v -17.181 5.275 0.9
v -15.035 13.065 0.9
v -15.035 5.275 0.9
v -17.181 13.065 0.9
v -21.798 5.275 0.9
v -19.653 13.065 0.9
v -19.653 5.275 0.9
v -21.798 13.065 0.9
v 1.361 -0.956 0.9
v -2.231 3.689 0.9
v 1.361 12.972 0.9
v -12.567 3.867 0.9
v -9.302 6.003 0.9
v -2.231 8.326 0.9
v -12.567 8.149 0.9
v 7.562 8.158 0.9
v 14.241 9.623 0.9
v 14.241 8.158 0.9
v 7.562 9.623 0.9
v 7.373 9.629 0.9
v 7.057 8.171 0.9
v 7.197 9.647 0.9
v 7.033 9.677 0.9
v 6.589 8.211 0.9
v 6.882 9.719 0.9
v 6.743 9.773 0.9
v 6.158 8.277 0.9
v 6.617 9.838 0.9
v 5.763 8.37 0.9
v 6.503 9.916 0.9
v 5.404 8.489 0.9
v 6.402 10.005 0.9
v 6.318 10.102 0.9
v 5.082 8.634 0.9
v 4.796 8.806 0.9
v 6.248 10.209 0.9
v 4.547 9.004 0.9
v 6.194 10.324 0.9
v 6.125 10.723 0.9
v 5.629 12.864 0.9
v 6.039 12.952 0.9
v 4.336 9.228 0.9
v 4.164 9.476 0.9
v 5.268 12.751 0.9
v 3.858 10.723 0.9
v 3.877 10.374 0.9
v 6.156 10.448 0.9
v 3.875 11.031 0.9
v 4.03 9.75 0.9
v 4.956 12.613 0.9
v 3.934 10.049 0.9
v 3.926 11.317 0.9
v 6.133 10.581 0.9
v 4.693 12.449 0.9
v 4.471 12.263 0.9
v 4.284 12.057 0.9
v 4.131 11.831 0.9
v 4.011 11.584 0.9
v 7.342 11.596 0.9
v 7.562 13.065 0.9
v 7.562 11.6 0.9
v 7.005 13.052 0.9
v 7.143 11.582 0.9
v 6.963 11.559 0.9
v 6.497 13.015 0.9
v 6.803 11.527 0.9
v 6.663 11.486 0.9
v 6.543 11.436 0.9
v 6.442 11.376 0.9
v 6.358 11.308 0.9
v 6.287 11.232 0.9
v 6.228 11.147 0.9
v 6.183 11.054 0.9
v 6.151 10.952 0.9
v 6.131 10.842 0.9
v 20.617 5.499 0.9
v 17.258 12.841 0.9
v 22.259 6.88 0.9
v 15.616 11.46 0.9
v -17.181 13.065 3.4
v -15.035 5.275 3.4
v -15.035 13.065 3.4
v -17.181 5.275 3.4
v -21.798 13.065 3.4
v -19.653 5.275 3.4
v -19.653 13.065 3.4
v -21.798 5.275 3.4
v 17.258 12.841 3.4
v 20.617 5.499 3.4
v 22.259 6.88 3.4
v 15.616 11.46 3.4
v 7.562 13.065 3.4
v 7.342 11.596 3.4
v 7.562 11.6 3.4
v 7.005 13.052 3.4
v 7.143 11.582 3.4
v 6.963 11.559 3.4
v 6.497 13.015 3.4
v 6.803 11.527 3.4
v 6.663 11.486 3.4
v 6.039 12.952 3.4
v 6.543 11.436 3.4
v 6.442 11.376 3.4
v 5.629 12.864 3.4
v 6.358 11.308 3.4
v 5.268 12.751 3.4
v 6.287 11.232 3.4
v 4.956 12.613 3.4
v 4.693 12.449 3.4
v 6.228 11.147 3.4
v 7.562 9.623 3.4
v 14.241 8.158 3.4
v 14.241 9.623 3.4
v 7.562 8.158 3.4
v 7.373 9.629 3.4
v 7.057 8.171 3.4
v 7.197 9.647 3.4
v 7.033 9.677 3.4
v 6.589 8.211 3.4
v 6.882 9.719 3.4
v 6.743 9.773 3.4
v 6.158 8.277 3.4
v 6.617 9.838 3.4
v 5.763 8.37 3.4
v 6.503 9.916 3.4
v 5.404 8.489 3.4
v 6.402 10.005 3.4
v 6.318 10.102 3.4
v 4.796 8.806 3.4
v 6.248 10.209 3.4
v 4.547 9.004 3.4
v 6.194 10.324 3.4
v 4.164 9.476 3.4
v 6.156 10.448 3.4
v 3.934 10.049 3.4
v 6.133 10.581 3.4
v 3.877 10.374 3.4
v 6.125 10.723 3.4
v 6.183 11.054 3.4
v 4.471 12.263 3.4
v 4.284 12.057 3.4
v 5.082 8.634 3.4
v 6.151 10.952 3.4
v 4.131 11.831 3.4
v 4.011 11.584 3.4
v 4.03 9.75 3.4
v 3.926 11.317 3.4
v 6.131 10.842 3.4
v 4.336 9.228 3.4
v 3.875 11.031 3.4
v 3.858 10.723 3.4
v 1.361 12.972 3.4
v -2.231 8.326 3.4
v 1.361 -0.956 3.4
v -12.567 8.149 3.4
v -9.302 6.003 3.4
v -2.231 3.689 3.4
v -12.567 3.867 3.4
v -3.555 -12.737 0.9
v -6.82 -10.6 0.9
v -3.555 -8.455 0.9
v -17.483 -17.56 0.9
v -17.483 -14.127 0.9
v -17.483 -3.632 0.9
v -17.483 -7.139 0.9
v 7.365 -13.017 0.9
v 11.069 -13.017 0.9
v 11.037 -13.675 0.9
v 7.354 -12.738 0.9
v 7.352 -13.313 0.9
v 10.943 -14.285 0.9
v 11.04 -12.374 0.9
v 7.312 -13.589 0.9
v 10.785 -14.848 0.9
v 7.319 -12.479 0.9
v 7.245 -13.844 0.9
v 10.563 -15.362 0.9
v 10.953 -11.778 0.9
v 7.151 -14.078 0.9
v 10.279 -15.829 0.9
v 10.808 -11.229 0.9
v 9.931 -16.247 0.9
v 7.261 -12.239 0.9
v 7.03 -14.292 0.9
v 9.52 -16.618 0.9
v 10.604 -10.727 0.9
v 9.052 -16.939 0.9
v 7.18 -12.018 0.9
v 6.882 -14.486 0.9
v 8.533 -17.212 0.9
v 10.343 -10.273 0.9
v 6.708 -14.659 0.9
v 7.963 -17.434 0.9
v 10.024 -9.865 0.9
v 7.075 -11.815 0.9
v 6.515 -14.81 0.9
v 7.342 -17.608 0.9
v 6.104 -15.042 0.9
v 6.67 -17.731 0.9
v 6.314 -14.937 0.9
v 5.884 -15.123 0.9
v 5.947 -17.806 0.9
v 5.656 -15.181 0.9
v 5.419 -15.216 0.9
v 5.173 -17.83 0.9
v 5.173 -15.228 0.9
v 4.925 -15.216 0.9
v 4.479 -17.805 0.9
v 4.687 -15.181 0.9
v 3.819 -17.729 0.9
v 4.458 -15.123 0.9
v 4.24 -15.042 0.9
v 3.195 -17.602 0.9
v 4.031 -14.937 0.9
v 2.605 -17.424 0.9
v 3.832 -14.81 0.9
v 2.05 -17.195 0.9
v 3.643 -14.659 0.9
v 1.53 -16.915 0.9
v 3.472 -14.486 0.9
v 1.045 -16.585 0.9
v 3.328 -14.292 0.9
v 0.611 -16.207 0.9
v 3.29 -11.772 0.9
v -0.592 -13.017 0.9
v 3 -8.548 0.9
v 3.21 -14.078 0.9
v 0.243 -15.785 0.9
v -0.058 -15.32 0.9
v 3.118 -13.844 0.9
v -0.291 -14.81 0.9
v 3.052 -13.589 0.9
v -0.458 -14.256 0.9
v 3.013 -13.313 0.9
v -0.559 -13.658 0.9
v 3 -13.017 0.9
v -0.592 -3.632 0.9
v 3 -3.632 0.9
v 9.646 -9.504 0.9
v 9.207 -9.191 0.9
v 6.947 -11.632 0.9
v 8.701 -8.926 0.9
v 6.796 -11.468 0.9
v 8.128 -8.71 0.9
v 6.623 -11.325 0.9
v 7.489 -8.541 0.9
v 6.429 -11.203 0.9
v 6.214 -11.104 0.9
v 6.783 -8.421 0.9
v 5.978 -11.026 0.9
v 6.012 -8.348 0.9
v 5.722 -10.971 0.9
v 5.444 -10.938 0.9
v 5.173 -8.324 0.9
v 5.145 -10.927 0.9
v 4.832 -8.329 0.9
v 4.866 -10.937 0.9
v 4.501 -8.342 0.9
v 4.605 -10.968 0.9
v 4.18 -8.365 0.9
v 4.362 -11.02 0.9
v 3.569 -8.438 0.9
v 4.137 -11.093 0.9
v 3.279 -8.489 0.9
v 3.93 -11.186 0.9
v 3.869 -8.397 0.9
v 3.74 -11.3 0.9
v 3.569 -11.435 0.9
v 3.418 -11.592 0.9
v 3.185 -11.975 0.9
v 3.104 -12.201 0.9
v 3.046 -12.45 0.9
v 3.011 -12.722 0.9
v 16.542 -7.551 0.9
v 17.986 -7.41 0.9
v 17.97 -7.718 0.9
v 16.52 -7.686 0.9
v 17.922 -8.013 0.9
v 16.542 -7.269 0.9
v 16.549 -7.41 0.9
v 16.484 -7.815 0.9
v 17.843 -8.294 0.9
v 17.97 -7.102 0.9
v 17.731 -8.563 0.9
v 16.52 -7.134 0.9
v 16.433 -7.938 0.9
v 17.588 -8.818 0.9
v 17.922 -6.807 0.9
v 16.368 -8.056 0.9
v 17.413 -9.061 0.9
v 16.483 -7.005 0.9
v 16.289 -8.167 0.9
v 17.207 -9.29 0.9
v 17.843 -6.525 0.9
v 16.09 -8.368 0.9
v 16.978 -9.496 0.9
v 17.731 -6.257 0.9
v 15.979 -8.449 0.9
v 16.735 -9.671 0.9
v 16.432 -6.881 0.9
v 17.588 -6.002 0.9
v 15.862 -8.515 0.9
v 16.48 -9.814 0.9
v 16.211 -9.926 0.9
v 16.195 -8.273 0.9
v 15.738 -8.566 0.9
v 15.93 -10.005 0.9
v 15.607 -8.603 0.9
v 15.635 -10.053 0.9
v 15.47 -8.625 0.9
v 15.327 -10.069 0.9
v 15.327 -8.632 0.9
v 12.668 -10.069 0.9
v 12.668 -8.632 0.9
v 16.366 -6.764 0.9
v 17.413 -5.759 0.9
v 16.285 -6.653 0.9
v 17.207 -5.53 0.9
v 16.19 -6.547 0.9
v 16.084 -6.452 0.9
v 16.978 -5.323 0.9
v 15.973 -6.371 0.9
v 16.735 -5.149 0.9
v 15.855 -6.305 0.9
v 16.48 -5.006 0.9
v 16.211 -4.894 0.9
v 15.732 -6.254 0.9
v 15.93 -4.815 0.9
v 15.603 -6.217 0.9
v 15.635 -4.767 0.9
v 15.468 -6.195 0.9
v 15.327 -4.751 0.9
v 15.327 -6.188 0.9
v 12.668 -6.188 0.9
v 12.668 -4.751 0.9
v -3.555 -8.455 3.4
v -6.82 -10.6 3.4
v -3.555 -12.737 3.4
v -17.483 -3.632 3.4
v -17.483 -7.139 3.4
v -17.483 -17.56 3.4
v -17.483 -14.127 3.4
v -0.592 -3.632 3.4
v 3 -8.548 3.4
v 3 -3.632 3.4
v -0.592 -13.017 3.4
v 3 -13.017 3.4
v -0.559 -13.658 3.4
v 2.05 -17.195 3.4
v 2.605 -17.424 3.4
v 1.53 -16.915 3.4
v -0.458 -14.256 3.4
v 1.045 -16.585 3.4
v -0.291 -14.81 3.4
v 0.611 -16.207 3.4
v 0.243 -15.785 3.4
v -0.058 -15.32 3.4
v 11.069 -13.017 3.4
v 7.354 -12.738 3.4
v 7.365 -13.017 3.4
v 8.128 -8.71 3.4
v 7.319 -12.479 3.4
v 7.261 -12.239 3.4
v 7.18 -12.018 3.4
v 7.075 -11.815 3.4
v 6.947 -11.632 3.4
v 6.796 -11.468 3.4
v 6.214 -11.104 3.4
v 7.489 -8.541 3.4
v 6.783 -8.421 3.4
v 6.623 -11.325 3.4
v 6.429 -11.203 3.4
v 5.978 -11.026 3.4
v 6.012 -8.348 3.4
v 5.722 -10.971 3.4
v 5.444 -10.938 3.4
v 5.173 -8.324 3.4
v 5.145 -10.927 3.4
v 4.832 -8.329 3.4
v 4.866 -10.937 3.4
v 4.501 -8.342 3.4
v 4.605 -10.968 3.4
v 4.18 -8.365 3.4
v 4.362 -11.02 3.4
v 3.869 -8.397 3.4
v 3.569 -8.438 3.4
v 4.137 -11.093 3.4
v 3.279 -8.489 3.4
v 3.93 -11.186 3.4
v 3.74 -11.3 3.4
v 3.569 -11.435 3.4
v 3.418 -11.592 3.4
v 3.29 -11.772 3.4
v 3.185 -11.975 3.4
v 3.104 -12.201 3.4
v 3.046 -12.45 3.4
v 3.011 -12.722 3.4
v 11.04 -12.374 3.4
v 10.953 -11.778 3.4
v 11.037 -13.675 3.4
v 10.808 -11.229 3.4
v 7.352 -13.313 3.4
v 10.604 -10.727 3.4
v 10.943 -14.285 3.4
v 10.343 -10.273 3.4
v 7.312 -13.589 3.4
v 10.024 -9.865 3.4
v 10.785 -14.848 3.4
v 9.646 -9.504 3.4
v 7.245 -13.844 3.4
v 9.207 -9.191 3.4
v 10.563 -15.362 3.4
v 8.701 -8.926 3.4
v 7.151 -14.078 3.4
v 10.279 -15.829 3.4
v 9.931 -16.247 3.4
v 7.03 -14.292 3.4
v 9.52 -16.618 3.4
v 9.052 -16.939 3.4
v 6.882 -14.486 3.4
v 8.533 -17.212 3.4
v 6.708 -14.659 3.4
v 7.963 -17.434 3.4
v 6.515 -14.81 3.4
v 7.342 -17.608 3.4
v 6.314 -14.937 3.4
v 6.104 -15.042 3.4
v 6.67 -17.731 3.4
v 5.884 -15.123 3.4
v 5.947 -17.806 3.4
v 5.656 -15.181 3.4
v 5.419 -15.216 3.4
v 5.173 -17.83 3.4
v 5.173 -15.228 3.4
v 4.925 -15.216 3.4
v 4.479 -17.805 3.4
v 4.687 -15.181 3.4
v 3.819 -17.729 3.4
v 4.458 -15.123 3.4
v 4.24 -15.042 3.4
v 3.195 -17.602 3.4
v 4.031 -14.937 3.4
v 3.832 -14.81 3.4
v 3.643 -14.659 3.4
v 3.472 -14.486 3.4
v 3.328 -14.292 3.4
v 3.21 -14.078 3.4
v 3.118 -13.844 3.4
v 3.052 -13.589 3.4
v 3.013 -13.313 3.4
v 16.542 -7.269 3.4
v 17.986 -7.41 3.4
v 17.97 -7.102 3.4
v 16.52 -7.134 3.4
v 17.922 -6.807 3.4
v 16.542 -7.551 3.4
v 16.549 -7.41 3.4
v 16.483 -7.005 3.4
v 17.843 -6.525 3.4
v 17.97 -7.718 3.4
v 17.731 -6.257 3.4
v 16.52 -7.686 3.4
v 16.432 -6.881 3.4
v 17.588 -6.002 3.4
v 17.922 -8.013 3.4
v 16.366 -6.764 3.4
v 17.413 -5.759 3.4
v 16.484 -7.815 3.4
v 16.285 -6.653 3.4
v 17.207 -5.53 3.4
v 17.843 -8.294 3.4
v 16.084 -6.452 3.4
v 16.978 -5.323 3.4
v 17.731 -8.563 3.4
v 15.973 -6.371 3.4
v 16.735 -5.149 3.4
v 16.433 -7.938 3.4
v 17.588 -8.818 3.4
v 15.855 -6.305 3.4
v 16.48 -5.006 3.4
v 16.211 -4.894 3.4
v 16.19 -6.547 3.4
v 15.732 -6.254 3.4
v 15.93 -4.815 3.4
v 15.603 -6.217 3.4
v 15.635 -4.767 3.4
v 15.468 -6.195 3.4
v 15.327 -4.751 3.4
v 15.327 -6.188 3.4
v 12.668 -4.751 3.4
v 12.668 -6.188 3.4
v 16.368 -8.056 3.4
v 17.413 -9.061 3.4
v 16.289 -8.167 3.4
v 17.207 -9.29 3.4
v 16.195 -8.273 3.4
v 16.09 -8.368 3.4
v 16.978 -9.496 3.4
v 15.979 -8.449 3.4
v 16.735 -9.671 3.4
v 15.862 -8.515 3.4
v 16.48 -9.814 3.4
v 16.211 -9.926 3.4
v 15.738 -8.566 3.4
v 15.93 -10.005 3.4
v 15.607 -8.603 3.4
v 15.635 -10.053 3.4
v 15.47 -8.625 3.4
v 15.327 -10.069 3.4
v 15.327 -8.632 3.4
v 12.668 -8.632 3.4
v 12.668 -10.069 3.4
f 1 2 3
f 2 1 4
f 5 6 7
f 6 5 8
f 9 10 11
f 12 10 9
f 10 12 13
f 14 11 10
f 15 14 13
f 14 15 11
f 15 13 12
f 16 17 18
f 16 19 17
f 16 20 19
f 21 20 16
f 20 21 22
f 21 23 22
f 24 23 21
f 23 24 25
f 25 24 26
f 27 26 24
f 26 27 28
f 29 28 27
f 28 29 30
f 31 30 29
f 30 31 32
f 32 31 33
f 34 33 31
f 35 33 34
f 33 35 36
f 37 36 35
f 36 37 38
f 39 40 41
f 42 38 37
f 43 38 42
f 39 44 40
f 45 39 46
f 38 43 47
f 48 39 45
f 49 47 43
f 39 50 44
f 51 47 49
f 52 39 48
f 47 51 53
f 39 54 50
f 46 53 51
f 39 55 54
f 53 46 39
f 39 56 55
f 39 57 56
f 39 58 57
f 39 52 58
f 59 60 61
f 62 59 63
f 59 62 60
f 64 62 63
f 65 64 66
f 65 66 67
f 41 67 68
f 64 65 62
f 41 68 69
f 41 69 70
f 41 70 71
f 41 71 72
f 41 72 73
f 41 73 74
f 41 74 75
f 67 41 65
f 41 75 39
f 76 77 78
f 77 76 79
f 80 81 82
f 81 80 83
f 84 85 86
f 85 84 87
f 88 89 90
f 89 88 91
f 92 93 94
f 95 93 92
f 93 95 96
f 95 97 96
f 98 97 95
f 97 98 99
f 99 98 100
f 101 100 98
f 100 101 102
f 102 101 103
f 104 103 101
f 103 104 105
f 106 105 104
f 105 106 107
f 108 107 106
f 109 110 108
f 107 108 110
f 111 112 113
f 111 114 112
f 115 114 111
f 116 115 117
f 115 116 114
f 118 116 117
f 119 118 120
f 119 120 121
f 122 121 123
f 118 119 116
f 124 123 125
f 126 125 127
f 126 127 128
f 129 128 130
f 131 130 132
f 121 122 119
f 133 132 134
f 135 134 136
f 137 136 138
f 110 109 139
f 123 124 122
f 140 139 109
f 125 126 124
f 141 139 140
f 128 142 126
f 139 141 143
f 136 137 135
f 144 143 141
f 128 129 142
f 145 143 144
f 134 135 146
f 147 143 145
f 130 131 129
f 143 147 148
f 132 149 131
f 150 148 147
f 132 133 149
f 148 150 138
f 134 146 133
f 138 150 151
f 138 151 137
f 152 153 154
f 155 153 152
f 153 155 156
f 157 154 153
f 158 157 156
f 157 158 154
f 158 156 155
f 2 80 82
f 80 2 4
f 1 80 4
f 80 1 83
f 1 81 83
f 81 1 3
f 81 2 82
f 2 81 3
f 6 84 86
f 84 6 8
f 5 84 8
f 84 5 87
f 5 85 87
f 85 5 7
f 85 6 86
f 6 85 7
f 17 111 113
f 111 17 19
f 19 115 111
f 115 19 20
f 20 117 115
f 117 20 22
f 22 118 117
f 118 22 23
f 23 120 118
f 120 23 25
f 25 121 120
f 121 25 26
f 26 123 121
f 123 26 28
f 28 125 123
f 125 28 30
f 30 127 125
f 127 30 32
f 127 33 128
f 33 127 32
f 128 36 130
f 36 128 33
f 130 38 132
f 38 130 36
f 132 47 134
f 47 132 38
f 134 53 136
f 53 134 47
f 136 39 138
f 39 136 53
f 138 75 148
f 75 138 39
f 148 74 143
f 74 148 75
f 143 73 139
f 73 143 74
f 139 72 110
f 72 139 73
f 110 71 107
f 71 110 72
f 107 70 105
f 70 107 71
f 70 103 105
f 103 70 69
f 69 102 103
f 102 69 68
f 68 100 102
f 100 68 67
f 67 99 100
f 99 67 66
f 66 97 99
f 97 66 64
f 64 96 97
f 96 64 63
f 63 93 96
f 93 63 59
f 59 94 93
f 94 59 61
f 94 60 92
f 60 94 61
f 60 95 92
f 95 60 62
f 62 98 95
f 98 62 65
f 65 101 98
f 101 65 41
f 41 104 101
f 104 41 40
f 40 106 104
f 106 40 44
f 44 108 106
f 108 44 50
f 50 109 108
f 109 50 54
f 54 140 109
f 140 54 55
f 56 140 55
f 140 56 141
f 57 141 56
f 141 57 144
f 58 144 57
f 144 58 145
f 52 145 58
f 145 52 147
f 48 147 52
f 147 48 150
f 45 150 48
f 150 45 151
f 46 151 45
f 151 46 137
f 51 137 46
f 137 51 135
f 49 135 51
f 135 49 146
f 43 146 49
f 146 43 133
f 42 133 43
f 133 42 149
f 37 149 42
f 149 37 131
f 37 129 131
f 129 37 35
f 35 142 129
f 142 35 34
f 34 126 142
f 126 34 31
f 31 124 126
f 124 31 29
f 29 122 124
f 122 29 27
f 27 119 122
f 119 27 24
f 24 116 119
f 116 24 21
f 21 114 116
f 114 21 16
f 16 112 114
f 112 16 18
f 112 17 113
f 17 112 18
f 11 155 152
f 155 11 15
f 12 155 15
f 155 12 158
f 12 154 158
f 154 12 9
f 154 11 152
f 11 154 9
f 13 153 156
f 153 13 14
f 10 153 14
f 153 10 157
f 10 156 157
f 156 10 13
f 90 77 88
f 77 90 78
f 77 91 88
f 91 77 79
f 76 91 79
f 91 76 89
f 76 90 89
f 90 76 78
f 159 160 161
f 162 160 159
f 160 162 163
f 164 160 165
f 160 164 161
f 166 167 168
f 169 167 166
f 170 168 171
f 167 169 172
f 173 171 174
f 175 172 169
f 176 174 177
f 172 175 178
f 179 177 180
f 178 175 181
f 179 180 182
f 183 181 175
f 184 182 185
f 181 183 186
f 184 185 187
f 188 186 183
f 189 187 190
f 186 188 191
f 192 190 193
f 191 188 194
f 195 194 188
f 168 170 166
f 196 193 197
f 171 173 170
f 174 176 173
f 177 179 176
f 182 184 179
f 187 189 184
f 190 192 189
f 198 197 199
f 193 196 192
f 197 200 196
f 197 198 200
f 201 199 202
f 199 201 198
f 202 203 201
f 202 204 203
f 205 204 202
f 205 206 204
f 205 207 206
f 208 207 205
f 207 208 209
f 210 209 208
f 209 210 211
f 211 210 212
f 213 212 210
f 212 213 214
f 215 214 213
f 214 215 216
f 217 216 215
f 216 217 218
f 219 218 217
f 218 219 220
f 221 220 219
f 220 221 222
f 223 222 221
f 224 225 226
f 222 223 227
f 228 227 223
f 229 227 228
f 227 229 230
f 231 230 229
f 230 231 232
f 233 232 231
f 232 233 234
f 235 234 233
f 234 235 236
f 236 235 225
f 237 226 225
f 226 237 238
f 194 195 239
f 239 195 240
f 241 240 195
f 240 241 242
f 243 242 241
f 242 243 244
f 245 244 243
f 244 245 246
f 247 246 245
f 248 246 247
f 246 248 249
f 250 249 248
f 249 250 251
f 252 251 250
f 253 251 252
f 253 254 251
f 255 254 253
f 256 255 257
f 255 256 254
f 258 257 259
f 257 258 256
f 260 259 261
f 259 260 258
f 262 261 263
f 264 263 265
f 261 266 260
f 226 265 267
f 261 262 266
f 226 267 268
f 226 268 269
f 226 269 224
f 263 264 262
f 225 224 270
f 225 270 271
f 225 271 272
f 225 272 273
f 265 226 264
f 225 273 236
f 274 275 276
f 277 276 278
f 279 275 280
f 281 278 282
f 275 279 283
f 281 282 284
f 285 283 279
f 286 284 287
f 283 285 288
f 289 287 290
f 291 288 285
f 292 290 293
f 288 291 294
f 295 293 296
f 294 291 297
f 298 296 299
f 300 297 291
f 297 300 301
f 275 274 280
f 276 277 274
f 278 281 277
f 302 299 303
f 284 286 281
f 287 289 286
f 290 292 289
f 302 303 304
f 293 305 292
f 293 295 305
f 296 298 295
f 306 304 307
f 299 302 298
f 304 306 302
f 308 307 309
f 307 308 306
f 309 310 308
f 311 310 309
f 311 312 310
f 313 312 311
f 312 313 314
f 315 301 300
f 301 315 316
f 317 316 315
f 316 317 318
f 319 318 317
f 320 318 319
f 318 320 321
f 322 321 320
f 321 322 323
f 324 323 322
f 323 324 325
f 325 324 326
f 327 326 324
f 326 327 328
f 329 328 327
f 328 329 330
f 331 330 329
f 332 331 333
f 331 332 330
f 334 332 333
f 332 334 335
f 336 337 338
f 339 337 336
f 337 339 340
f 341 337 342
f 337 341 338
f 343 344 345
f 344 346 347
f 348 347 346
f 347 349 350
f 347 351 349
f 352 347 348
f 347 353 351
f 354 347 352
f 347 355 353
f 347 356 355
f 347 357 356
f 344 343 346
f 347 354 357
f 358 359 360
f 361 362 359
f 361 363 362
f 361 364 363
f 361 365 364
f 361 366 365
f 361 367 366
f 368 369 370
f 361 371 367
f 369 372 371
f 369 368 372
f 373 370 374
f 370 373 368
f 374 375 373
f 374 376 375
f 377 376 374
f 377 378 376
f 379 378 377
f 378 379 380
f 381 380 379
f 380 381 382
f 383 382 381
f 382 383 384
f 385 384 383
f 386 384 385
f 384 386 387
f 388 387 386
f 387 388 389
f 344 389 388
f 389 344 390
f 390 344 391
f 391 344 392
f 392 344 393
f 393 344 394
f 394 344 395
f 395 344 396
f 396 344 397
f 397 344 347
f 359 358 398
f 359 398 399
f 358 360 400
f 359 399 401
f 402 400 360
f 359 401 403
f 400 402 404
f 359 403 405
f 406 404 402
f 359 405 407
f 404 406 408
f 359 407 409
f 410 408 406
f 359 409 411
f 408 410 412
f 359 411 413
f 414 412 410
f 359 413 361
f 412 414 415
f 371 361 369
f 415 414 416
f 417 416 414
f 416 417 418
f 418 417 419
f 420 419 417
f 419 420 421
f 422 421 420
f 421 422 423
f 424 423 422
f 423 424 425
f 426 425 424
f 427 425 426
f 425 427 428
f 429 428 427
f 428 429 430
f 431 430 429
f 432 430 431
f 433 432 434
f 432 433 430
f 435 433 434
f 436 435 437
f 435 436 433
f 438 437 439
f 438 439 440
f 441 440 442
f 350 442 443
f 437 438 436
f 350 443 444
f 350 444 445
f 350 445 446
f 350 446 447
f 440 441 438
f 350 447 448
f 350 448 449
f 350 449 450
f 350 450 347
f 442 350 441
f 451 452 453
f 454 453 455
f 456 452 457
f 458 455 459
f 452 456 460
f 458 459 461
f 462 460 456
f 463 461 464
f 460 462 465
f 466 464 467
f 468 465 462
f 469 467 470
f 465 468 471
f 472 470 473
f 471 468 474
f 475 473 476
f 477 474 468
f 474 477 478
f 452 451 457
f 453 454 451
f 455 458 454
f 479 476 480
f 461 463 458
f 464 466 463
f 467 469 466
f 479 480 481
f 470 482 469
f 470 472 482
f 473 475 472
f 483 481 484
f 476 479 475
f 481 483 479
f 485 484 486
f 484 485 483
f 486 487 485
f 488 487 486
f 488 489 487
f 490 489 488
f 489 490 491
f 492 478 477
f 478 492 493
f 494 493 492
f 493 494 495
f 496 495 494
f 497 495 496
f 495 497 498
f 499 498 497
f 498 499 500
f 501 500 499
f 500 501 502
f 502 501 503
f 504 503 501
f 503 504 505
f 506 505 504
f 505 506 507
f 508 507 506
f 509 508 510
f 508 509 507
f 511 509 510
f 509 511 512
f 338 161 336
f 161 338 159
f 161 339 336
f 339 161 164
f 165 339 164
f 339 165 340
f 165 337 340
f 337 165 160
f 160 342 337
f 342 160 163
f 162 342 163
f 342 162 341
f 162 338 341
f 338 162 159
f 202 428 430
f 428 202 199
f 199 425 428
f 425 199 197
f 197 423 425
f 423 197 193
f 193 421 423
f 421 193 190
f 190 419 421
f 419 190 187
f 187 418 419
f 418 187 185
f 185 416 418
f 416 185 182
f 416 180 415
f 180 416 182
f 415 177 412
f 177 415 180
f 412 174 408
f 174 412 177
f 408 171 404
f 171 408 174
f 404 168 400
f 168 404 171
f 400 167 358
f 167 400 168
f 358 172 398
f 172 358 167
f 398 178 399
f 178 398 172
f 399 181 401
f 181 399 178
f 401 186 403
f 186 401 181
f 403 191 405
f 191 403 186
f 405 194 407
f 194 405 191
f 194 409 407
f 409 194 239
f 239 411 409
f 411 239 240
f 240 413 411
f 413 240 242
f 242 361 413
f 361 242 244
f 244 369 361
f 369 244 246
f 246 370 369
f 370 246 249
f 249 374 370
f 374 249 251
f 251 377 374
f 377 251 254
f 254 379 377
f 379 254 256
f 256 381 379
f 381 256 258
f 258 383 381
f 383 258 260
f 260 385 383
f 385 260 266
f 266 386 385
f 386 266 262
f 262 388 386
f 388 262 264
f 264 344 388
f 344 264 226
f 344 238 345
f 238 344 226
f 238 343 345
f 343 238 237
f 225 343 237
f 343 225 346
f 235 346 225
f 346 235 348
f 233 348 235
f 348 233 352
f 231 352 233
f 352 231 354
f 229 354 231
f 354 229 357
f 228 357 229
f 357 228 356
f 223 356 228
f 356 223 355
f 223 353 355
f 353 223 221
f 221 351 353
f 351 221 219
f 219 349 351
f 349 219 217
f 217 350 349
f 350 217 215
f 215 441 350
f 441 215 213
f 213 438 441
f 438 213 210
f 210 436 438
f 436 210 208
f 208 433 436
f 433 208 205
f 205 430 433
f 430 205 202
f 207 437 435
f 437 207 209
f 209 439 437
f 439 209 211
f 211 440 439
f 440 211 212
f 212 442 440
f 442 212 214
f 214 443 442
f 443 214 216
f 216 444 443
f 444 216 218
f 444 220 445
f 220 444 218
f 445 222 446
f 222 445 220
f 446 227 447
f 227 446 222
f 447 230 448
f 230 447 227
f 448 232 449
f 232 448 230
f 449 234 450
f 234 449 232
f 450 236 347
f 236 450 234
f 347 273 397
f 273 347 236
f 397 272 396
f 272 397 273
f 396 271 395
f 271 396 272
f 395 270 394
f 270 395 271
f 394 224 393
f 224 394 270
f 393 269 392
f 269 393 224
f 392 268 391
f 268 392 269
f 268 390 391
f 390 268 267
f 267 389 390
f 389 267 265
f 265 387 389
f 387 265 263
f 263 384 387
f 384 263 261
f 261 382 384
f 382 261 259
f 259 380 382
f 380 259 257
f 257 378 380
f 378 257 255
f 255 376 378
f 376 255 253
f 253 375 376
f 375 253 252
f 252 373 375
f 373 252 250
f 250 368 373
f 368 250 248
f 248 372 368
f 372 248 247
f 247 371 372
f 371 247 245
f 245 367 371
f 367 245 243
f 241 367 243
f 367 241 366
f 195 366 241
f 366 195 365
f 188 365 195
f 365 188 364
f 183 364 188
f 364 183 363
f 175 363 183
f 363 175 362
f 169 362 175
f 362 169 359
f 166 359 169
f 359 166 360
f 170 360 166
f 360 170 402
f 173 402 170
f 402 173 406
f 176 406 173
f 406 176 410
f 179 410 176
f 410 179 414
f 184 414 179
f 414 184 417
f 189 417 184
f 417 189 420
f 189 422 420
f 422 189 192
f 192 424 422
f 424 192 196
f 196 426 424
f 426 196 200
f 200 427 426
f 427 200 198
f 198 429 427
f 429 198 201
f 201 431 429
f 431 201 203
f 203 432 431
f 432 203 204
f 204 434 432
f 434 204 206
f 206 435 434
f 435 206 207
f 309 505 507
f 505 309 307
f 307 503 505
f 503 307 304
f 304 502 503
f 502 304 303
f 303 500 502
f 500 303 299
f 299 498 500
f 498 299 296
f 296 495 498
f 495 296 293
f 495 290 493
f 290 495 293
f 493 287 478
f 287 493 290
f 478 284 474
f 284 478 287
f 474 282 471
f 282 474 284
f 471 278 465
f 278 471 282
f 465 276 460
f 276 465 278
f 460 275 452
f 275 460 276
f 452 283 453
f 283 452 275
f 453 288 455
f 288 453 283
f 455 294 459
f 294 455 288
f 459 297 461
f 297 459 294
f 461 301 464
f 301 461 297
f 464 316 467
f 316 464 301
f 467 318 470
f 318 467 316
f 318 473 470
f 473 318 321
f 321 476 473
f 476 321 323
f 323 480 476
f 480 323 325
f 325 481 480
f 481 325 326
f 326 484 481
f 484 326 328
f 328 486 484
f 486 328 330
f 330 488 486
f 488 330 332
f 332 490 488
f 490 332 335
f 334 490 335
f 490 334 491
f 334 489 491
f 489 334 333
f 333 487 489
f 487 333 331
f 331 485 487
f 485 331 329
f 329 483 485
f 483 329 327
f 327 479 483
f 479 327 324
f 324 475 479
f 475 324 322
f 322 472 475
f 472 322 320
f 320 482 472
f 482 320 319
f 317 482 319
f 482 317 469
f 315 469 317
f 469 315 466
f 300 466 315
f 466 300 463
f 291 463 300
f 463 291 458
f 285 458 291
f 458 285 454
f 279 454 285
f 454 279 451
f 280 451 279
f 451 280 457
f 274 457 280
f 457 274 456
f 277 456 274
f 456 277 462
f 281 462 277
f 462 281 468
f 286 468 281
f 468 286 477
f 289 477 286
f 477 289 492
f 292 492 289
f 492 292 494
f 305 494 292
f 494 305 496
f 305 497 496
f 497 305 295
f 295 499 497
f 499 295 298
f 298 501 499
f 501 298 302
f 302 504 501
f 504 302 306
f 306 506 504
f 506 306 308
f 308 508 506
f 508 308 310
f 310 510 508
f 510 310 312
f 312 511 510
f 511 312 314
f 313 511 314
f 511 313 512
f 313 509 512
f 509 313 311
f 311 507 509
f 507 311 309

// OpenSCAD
$fn = 48;
  // syllabics (overlaid on icon, tallest)
  translate([0, 5.892, 0.900]) linear_extrude(height=2.500) text("ᐦᐊᓪᐠ", size=13.757, halign="center", valign="center", font="Euphemia UCAS:style=Bold");
  translate([0, -10.892, 0.900]) linear_extrude(height=2.500) text("ᐳᑲᐣ", size=13.757, halign="center", valign="center", font="Euphemia UCAS:style=Bold");
